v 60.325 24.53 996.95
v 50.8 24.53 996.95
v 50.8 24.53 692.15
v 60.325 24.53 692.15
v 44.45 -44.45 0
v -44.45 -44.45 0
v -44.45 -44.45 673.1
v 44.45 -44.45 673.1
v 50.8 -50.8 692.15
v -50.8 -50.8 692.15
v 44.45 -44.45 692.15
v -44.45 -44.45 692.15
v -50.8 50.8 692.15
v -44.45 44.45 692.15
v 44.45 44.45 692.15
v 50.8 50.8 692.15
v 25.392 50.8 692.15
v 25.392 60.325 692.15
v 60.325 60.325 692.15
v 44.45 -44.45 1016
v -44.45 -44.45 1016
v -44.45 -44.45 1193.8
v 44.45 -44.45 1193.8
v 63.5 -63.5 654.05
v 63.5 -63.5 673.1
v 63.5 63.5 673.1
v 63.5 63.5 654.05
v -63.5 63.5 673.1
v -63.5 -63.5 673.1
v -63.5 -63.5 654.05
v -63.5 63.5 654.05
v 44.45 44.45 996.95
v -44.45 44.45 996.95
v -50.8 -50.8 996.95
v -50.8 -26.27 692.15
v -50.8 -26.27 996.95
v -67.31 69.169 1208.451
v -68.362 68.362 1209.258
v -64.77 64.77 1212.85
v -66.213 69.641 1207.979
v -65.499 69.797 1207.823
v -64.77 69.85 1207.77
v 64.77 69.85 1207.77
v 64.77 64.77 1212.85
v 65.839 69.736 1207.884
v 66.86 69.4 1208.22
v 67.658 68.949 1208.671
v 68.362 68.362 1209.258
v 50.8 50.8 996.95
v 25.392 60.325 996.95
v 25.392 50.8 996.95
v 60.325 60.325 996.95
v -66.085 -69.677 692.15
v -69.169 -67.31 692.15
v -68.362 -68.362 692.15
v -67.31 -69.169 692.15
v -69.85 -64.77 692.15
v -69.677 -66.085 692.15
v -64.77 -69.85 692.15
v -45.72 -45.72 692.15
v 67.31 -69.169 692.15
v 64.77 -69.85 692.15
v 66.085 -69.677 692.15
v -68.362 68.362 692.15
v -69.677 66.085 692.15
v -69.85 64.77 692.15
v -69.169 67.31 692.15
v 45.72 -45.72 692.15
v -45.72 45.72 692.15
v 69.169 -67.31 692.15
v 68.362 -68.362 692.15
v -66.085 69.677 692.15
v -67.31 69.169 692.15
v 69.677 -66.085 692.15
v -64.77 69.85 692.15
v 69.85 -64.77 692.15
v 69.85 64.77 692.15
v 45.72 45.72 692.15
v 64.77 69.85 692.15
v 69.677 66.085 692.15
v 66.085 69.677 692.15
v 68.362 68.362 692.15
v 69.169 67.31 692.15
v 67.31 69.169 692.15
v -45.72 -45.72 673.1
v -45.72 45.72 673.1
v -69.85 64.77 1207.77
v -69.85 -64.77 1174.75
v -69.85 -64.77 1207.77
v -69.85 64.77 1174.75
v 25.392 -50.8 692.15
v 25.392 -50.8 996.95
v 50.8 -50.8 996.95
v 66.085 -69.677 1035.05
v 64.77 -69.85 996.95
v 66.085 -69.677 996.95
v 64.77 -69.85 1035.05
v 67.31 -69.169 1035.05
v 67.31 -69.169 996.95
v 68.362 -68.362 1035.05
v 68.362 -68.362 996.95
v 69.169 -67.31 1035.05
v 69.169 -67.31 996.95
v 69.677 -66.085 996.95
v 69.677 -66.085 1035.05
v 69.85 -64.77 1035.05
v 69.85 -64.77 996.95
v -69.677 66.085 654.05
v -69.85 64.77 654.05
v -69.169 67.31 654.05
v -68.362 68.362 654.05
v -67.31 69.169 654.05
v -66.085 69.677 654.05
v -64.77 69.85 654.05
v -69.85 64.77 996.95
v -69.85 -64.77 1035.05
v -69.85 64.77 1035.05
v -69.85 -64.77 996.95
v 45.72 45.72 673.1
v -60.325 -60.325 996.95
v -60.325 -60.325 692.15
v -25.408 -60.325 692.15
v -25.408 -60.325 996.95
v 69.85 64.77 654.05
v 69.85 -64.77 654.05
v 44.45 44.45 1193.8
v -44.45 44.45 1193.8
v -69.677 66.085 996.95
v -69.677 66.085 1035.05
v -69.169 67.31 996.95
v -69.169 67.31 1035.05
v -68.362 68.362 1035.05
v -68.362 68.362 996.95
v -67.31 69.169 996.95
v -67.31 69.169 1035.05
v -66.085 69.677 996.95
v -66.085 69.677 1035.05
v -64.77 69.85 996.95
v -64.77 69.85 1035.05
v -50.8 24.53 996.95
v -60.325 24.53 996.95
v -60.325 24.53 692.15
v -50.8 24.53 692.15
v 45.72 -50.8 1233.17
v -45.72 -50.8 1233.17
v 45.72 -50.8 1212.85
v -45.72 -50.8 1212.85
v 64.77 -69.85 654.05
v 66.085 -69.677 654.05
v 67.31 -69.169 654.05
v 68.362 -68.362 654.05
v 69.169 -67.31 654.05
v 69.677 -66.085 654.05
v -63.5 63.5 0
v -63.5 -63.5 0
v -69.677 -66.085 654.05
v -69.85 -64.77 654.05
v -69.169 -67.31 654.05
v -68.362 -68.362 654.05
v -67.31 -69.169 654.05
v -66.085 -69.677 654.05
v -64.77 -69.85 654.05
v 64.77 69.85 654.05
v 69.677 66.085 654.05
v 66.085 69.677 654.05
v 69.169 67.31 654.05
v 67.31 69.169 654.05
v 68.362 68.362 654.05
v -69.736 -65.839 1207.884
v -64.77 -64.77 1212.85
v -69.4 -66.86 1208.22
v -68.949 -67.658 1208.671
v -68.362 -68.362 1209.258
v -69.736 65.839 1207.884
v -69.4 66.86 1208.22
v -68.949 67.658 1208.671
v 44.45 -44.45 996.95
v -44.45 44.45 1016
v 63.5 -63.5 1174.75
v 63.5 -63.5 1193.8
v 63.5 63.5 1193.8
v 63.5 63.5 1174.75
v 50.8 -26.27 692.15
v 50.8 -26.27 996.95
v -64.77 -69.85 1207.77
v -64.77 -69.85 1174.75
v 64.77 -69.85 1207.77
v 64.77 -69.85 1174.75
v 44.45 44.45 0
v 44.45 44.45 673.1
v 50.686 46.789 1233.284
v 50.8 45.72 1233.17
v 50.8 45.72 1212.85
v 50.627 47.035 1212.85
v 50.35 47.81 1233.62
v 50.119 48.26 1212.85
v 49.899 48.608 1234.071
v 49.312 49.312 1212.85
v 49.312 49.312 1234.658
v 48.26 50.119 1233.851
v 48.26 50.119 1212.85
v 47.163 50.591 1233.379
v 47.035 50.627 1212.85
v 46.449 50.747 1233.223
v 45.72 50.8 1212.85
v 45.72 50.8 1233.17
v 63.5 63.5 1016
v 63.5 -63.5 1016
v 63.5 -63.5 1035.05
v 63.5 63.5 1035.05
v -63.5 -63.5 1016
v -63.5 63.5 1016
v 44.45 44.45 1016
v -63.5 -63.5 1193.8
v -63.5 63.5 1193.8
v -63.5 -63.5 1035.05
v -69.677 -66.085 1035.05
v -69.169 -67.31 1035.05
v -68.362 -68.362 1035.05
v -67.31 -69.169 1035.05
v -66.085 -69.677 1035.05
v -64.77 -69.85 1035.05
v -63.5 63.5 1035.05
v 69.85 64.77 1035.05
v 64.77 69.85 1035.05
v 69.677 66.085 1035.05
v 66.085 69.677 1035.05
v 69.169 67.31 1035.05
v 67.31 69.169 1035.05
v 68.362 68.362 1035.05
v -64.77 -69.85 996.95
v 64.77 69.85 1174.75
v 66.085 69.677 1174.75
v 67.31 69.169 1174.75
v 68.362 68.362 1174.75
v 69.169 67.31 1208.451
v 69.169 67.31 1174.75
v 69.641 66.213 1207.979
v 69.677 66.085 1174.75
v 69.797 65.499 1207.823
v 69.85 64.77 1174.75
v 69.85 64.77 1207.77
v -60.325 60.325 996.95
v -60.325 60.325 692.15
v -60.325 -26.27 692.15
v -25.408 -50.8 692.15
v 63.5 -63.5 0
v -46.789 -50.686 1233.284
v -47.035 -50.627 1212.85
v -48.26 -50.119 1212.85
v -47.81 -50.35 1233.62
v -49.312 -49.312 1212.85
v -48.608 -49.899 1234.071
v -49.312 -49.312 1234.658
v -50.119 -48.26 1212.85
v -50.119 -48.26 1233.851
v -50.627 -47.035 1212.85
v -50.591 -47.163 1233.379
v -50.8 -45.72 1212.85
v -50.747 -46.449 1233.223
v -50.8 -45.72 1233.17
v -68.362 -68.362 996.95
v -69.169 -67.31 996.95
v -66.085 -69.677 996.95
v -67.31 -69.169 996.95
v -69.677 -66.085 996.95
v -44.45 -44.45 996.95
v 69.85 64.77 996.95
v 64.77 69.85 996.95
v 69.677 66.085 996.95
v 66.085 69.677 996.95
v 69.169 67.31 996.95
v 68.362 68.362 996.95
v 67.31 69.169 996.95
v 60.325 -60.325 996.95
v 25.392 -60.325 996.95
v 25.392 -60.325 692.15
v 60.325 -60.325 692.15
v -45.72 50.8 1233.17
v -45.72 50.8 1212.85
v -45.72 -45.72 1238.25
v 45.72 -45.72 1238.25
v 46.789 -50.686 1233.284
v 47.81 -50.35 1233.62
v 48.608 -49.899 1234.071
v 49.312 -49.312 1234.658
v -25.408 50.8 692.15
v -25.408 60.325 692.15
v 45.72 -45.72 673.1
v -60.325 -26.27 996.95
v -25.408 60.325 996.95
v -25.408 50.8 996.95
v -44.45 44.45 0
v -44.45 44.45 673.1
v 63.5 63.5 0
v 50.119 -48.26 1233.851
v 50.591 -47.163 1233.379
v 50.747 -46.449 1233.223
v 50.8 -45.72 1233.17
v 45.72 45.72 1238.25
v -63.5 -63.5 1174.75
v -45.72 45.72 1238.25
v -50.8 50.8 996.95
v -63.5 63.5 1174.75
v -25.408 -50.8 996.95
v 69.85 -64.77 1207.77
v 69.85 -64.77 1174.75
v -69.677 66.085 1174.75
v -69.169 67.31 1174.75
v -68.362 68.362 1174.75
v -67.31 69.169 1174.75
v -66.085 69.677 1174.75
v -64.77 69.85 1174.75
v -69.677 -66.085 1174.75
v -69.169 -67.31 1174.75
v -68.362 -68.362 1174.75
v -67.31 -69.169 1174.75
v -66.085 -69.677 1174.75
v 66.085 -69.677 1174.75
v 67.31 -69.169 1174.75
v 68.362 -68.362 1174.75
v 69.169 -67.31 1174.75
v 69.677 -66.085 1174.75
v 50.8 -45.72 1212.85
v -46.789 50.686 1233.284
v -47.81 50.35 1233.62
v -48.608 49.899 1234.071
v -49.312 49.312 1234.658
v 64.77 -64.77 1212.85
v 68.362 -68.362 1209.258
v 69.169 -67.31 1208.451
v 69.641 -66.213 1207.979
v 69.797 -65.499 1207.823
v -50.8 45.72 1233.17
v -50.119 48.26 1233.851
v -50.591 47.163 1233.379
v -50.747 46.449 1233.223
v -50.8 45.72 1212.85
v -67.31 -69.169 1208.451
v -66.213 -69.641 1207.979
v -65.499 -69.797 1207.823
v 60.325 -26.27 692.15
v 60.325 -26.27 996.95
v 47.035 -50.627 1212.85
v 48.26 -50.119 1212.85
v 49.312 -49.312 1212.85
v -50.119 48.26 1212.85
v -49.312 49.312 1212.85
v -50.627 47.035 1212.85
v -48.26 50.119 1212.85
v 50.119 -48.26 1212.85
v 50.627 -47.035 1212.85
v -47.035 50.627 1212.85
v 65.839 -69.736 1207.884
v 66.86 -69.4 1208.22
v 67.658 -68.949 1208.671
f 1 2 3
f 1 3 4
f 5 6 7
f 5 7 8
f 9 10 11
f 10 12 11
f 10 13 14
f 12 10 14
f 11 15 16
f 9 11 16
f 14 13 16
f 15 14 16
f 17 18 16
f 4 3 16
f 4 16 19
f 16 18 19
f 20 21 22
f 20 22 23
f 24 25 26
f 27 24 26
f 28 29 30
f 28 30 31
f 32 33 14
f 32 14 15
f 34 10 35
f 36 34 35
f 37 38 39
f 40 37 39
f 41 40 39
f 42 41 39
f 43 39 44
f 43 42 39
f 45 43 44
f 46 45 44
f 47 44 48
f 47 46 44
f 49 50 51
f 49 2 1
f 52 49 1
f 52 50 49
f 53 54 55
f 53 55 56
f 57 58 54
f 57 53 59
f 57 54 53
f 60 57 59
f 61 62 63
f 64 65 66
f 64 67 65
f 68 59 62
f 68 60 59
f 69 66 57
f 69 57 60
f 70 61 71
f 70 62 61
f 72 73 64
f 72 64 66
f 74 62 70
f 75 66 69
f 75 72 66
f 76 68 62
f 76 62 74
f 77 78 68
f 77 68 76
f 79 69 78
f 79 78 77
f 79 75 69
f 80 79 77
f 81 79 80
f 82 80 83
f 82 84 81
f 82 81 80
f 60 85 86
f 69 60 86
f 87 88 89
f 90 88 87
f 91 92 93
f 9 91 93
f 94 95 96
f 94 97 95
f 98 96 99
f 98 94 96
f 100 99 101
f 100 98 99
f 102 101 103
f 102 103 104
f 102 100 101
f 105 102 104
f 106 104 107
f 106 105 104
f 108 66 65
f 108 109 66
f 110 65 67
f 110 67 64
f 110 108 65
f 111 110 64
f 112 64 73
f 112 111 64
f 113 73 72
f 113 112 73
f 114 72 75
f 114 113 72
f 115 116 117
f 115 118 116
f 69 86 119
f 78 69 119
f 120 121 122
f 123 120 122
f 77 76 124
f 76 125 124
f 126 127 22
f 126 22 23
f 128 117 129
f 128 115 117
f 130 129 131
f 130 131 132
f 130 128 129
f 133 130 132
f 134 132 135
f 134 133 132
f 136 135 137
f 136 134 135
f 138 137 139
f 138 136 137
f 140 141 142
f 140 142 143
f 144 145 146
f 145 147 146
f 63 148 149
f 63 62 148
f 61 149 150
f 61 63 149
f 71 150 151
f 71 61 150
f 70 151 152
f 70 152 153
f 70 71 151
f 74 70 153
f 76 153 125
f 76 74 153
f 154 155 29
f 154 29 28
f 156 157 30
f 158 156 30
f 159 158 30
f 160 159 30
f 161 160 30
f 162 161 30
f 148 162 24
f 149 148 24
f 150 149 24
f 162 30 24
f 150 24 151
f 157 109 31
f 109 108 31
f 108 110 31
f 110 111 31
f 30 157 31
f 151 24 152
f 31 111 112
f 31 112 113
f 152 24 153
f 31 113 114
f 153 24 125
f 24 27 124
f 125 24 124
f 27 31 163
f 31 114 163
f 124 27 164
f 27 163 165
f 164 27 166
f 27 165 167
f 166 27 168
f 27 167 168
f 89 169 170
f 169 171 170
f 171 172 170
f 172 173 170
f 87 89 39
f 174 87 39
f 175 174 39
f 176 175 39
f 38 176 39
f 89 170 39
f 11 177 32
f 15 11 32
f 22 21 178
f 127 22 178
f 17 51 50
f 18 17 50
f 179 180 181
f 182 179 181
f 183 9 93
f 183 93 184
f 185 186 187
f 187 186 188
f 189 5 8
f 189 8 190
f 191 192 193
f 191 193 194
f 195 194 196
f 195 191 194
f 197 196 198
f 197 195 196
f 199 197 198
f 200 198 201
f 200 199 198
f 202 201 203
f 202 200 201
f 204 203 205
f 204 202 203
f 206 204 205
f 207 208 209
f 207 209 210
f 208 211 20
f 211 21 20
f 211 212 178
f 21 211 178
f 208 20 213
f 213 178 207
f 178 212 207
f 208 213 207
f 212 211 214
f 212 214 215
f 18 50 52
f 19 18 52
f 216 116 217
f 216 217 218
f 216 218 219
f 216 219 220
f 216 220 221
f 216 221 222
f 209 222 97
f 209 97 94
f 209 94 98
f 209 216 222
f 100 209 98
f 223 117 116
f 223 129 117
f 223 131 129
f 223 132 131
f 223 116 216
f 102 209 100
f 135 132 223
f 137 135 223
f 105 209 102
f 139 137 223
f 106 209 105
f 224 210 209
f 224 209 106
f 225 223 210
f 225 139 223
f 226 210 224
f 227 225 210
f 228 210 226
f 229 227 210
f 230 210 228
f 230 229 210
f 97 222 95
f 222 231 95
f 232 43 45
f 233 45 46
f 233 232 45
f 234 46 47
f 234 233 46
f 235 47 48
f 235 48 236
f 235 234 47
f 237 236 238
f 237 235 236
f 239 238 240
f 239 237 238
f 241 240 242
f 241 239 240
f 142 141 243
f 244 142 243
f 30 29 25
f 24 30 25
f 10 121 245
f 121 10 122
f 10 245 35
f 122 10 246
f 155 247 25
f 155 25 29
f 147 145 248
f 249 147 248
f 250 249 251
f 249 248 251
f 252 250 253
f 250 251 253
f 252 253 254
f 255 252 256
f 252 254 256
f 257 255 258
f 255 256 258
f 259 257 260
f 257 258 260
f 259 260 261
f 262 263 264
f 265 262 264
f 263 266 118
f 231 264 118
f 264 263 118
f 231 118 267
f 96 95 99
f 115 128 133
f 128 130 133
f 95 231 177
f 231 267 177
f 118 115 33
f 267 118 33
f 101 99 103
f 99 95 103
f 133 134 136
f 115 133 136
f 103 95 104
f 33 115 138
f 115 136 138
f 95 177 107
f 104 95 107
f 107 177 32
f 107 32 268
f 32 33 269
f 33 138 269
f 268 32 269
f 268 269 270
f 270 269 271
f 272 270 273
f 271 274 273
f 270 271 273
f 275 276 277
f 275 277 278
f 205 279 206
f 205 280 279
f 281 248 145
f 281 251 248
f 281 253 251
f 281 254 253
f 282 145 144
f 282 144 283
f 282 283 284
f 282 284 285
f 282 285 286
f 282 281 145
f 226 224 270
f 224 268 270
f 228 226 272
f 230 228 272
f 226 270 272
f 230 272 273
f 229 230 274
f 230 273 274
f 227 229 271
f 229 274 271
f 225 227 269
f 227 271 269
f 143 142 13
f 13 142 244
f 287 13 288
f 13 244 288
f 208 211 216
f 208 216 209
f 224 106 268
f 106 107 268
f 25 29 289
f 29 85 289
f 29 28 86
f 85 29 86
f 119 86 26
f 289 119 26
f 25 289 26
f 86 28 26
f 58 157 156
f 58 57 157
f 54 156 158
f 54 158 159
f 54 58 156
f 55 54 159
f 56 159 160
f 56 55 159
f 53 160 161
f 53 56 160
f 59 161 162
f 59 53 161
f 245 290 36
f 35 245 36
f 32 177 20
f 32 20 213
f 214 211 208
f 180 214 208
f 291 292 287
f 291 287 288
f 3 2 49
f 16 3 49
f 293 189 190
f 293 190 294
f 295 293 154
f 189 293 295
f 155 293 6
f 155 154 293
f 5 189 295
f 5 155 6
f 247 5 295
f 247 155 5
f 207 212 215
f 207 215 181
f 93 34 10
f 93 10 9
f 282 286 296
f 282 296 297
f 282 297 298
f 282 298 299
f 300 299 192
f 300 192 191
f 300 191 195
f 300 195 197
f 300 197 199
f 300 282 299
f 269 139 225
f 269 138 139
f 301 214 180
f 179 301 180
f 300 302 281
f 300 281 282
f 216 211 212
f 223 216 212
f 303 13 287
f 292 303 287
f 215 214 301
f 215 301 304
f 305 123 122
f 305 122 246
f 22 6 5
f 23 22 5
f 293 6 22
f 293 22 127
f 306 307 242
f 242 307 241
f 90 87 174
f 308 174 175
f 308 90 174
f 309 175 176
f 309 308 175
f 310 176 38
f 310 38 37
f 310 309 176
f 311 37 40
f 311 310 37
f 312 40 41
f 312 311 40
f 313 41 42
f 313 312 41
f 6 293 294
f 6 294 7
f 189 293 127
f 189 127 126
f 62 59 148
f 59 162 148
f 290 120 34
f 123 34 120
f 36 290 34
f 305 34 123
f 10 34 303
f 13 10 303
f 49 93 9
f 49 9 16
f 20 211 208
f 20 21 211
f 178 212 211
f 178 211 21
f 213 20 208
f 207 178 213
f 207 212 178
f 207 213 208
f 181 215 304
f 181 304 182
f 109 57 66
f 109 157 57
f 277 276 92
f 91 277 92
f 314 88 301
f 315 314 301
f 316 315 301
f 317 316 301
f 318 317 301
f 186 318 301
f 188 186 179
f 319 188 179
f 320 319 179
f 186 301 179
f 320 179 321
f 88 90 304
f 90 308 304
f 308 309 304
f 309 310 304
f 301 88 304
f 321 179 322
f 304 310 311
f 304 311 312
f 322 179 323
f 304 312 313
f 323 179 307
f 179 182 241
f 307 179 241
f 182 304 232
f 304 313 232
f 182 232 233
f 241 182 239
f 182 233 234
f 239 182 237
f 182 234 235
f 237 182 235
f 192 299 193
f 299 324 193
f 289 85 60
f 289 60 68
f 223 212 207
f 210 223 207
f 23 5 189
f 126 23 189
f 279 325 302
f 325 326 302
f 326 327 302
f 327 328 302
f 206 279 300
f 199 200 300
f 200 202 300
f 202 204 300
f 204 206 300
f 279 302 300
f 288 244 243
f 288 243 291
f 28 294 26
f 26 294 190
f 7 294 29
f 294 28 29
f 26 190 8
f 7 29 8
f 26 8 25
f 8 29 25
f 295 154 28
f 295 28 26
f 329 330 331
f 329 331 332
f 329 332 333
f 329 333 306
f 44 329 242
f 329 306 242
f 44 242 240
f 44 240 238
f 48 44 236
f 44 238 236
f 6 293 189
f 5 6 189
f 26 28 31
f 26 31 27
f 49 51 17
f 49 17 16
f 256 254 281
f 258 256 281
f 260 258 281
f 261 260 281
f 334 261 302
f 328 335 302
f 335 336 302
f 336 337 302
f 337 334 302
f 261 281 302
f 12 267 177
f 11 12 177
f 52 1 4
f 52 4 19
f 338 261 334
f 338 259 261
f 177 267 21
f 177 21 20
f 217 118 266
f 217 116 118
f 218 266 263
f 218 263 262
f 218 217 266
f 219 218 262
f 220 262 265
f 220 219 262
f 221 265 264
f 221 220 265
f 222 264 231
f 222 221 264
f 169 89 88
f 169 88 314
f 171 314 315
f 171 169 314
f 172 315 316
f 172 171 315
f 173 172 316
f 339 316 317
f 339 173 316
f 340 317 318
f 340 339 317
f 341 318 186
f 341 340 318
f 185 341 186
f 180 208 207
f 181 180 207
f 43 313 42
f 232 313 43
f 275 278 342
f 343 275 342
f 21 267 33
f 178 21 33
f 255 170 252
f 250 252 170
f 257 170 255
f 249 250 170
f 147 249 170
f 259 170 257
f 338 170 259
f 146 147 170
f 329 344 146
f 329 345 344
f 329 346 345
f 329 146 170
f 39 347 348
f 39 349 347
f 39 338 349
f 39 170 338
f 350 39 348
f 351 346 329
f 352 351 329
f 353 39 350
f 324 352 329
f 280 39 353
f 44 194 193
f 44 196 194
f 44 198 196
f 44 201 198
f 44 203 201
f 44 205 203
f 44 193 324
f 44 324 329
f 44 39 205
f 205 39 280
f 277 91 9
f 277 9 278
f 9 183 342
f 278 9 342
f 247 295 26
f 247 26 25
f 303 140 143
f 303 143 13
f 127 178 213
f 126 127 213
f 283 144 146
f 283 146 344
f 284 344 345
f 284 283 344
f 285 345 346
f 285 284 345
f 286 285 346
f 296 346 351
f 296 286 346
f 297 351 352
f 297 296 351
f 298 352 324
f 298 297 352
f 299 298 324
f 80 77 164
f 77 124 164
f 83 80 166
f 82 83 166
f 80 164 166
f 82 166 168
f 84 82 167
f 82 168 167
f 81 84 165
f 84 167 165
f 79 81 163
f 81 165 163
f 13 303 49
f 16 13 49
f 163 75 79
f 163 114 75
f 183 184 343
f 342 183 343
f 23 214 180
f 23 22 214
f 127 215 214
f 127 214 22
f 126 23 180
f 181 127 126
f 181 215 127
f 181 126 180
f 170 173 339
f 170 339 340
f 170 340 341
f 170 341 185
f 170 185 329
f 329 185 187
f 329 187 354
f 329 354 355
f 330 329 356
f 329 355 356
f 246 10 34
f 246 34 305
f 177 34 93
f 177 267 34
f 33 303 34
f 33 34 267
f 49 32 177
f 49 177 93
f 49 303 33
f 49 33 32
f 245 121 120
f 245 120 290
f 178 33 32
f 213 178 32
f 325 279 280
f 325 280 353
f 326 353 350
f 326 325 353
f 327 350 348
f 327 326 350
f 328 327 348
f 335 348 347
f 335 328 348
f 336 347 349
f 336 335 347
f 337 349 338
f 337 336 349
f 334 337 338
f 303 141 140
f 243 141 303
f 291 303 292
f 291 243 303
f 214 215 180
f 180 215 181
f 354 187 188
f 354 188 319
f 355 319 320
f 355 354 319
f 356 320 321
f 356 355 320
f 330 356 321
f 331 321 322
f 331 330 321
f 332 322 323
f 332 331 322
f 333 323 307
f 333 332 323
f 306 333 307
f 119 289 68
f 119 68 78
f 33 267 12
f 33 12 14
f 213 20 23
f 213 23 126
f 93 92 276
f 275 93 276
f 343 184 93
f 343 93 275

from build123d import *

# Parameters (mm, degrees)
F0_W      = 88.9
F0_H      = 88.9
F1_DEPTH  = 1193.8
F3_DEPTH  = 673.1
F4_W      = 139.7
F4_H      = 139.7
F4_W_2    = 127
F4_H_2    = 127
F5_DEPTH  = 19.05
F6_W      = 139.7
F6_H      = 139.7
F6_W_2    = 91.44
F6_H_2    = 91.44
F7_DEPTH  = 19.05
F8_W      = 101.6
F8_H      = 101.6
F8_W_2    = 88.9
F8_H_2    = 88.9
F9_DEPTH  = 304.8
F10_W     = 139.7
F10_H     = 139.7
F10_W_2   = 88.9
F10_H_2   = 88.9
F11_DEPTH = 19.05
F12_W     = 139.7
F12_H     = 139.7
F12_W_2   = 127
F12_H_2   = 127
F13_DEPTH = 19.05
F14_W     = 127
F14_H     = 127
F14_W_2   = 88.9
F14_H_2   = 88.9
F15_DEPTH = 177.8
F16_W     = 120.65
F16_H     = 120.65
F16_W_2   = 101.6
F16_H_2   = 101.6
F17_DEPTH = 304.8
F18_W     = 9.525
F18_H     = 50.8
F18_W_2   = 50.8
F18_H_2   = 9.525
F19_DEPTH = 304.8
F20_W     = 139.7
F20_H     = 139.7
F20_W_2   = 127
F20_H_2   = 127
F21_DEPTH = 19.05
F22_W     = 139.7
F22_H     = 139.7
F23_DEPTH = 19.05
F24_W     = 101.6
F24_H     = 101.6
F25_DEPTH = 25.4
F26_SIZE  = 5.08
F27_R     = 5.08
F27_2_R   = 5.08
F27_3_R   = 5.08


with BuildPart() as f1:
    # F0 (on Top) → F1 (new body)
    with BuildSketch(Plane.XY):
        Rectangle(F0_W, F0_H)
    extrude(amount=F1_DEPTH)


with BuildPart() as f3:
    # F2 (on face) → F3 (new body)
    with BuildSketch(Plane(origin=(0, 0, 0), x_dir=(1, 0, 0), z_dir=(0, 0, -1))):
        Polygon((-44.45, 44.45), (-63.5, 63.5), (-63.5, -63.5), (-44.45, -44.45), align=None)
        Polygon((63.5, 63.5), (-63.5, 63.5), (-44.45, 44.45), (44.45, 44.45), align=None)
        Polygon((63.5, -63.5), (63.5, 63.5), (44.45, 44.45), (44.45, -44.45), align=None)
        Polygon((-44.45, -44.45), (-63.5, -63.5), (63.5, -63.5), (44.45, -44.45), align=None)
    extrude(amount=-F3_DEPTH)


with BuildPart() as f5:
    # F4 (on face) → F5 (new body)
    with BuildSketch(Plane.XY.offset(673.1)):
        Rectangle(F4_W, F4_H)
        Rectangle(F4_W_2, F4_H_2, mode=Mode.SUBTRACT)
    extrude(amount=-F5_DEPTH)

    # F6 (on face) → F7 (join)
    with BuildSketch(Plane.XY.offset(673.1)):
        Rectangle(F6_W, F6_H)
        Rectangle(F6_W_2, F6_H_2, mode=Mode.SUBTRACT)
    extrude(amount=F7_DEPTH)

    # F27
    f27_edges = [f5.edges().sort_by_distance(p)[0] for p in [
        (69.85, 69.85, 673.1),
        (69.85, -69.85, 673.1),
        (-69.85, -69.85, 673.1),
        (-69.85, 69.85, 673.1),
    ]]
    fillet(f27_edges, radius=F27_R)


with BuildPart() as f9:
    # F8 (on face) → F9 (new body)
    with BuildSketch(Plane.XY.offset(692.15)):
        Rectangle(F8_W, F8_H)
        Rectangle(F8_W_2, F8_H_2, mode=Mode.SUBTRACT)
    extrude(amount=F9_DEPTH)


with BuildPart() as f11:
    # F10 (on face) → F11 (new body)
    with BuildSketch(Plane.XY.offset(996.95)):
        Rectangle(F10_W, F10_H)
        Rectangle(F10_W_2, F10_H_2, mode=Mode.SUBTRACT)
    extrude(amount=F11_DEPTH)

    # F12 (on face) → F13 (join)
    with BuildSketch(Plane.XY.offset(1016)):
        Rectangle(F12_W, F12_H)
        Rectangle(F12_W_2, F12_H_2, mode=Mode.SUBTRACT)
    extrude(amount=F13_DEPTH)

    # F27#2
    f27_2_edges = [f11.edges().sort_by_distance(p)[0] for p in [
        (-69.85, -69.85, 1016),
        (69.85, -69.85, 1016),
        (-69.85, 69.85, 1016),
        (69.85, 69.85, 1016),
    ]]
    fillet(f27_2_edges, radius=F27_2_R)


with BuildPart() as f15:
    # F14 (on face) → F15 (new body)
    with BuildSketch(Plane.XY.offset(1016)):
        Rectangle(F14_W, F14_H)
        Rectangle(F14_W_2, F14_H_2, mode=Mode.SUBTRACT)
    extrude(amount=F15_DEPTH)


with BuildPart() as f17:
    # F16 (on face) → F17 (new body)
    with BuildSketch(Plane.XY.offset(692.15)):
        Rectangle(F16_W, F16_H)
        Rectangle(F16_W_2, F16_H_2, mode=Mode.SUBTRACT)
    extrude(amount=F17_DEPTH)

    # F18 (on face) → F19 (cut)
    with BuildSketch(Plane.XY.offset(996.95)):
        with Locations((-55.5625, -0.8699878395)):
            Rectangle(F18_W, F18_H)
        with Locations((55.5625, -0.8699878395)):
            Rectangle(F18_W, F18_H)
        with Locations((-0.0076036245, 55.5625)):
            Rectangle(F18_W_2, F18_H_2)
        with Locations((-0.0076036245, -55.5625)):
            Rectangle(F18_W_2, F18_H_2)
    extrude(amount=-F19_DEPTH, mode=Mode.SUBTRACT)


with BuildPart() as f21:
    # F20 (on face) → F21 (new body)
    with BuildSketch(Plane.XY.offset(1193.8)):
        Rectangle(F20_W, F20_H)
        Rectangle(F20_W_2, F20_H_2, mode=Mode.SUBTRACT)
    extrude(amount=-F21_DEPTH)

    # F22 (on face) → F23 (join)
    with BuildSketch(Plane.XY.offset(1193.8)):
        Rectangle(F22_W, F22_H)
    extrude(amount=F23_DEPTH)

    # F24 (on face) → F25 (join)
    with BuildSketch(Plane.XY.offset(1212.85)):
        Rectangle(F24_W, F24_H)
    extrude(amount=F25_DEPTH)

    # F26
    f26_edges = [f21.edges().sort_by_distance(p)[0] for p in [
        (0, 50.8, 1238.25),
        (-50.8, 0, 1238.25),
        (0, -50.8, 1238.25),
        (50.8, 0, 1238.25),
        (69.85, 0, 1212.85),
        (0, -69.85, 1212.85),
        (-69.85, 0, 1212.85),
        (0, 69.85, 1212.85),
    ]]
    chamfer(f26_edges, length=F26_SIZE)

    # F27#3
    f27_3_edges = [f21.edges().sort_by_distance(p)[0] for p in [
        (69.85, 69.85, 1191.26),
        (50.8, 50.8, 1223.01),
        (69.85, -69.85, 1191.26),
        (50.8, -50.8, 1223.01),
        (-69.85, -69.85, 1191.26),
        (-50.8, -50.8, 1223.01),
        (-69.85, 69.85, 1191.26),
        (-50.8, 50.8, 1223.01),
    ]]
    fillet(f27_3_edges, radius=F27_3_R)


solid = Compound([f1.part, f3.part, f5.part, f9.part, f11.part, f15.part, f17.part, f21.part])
